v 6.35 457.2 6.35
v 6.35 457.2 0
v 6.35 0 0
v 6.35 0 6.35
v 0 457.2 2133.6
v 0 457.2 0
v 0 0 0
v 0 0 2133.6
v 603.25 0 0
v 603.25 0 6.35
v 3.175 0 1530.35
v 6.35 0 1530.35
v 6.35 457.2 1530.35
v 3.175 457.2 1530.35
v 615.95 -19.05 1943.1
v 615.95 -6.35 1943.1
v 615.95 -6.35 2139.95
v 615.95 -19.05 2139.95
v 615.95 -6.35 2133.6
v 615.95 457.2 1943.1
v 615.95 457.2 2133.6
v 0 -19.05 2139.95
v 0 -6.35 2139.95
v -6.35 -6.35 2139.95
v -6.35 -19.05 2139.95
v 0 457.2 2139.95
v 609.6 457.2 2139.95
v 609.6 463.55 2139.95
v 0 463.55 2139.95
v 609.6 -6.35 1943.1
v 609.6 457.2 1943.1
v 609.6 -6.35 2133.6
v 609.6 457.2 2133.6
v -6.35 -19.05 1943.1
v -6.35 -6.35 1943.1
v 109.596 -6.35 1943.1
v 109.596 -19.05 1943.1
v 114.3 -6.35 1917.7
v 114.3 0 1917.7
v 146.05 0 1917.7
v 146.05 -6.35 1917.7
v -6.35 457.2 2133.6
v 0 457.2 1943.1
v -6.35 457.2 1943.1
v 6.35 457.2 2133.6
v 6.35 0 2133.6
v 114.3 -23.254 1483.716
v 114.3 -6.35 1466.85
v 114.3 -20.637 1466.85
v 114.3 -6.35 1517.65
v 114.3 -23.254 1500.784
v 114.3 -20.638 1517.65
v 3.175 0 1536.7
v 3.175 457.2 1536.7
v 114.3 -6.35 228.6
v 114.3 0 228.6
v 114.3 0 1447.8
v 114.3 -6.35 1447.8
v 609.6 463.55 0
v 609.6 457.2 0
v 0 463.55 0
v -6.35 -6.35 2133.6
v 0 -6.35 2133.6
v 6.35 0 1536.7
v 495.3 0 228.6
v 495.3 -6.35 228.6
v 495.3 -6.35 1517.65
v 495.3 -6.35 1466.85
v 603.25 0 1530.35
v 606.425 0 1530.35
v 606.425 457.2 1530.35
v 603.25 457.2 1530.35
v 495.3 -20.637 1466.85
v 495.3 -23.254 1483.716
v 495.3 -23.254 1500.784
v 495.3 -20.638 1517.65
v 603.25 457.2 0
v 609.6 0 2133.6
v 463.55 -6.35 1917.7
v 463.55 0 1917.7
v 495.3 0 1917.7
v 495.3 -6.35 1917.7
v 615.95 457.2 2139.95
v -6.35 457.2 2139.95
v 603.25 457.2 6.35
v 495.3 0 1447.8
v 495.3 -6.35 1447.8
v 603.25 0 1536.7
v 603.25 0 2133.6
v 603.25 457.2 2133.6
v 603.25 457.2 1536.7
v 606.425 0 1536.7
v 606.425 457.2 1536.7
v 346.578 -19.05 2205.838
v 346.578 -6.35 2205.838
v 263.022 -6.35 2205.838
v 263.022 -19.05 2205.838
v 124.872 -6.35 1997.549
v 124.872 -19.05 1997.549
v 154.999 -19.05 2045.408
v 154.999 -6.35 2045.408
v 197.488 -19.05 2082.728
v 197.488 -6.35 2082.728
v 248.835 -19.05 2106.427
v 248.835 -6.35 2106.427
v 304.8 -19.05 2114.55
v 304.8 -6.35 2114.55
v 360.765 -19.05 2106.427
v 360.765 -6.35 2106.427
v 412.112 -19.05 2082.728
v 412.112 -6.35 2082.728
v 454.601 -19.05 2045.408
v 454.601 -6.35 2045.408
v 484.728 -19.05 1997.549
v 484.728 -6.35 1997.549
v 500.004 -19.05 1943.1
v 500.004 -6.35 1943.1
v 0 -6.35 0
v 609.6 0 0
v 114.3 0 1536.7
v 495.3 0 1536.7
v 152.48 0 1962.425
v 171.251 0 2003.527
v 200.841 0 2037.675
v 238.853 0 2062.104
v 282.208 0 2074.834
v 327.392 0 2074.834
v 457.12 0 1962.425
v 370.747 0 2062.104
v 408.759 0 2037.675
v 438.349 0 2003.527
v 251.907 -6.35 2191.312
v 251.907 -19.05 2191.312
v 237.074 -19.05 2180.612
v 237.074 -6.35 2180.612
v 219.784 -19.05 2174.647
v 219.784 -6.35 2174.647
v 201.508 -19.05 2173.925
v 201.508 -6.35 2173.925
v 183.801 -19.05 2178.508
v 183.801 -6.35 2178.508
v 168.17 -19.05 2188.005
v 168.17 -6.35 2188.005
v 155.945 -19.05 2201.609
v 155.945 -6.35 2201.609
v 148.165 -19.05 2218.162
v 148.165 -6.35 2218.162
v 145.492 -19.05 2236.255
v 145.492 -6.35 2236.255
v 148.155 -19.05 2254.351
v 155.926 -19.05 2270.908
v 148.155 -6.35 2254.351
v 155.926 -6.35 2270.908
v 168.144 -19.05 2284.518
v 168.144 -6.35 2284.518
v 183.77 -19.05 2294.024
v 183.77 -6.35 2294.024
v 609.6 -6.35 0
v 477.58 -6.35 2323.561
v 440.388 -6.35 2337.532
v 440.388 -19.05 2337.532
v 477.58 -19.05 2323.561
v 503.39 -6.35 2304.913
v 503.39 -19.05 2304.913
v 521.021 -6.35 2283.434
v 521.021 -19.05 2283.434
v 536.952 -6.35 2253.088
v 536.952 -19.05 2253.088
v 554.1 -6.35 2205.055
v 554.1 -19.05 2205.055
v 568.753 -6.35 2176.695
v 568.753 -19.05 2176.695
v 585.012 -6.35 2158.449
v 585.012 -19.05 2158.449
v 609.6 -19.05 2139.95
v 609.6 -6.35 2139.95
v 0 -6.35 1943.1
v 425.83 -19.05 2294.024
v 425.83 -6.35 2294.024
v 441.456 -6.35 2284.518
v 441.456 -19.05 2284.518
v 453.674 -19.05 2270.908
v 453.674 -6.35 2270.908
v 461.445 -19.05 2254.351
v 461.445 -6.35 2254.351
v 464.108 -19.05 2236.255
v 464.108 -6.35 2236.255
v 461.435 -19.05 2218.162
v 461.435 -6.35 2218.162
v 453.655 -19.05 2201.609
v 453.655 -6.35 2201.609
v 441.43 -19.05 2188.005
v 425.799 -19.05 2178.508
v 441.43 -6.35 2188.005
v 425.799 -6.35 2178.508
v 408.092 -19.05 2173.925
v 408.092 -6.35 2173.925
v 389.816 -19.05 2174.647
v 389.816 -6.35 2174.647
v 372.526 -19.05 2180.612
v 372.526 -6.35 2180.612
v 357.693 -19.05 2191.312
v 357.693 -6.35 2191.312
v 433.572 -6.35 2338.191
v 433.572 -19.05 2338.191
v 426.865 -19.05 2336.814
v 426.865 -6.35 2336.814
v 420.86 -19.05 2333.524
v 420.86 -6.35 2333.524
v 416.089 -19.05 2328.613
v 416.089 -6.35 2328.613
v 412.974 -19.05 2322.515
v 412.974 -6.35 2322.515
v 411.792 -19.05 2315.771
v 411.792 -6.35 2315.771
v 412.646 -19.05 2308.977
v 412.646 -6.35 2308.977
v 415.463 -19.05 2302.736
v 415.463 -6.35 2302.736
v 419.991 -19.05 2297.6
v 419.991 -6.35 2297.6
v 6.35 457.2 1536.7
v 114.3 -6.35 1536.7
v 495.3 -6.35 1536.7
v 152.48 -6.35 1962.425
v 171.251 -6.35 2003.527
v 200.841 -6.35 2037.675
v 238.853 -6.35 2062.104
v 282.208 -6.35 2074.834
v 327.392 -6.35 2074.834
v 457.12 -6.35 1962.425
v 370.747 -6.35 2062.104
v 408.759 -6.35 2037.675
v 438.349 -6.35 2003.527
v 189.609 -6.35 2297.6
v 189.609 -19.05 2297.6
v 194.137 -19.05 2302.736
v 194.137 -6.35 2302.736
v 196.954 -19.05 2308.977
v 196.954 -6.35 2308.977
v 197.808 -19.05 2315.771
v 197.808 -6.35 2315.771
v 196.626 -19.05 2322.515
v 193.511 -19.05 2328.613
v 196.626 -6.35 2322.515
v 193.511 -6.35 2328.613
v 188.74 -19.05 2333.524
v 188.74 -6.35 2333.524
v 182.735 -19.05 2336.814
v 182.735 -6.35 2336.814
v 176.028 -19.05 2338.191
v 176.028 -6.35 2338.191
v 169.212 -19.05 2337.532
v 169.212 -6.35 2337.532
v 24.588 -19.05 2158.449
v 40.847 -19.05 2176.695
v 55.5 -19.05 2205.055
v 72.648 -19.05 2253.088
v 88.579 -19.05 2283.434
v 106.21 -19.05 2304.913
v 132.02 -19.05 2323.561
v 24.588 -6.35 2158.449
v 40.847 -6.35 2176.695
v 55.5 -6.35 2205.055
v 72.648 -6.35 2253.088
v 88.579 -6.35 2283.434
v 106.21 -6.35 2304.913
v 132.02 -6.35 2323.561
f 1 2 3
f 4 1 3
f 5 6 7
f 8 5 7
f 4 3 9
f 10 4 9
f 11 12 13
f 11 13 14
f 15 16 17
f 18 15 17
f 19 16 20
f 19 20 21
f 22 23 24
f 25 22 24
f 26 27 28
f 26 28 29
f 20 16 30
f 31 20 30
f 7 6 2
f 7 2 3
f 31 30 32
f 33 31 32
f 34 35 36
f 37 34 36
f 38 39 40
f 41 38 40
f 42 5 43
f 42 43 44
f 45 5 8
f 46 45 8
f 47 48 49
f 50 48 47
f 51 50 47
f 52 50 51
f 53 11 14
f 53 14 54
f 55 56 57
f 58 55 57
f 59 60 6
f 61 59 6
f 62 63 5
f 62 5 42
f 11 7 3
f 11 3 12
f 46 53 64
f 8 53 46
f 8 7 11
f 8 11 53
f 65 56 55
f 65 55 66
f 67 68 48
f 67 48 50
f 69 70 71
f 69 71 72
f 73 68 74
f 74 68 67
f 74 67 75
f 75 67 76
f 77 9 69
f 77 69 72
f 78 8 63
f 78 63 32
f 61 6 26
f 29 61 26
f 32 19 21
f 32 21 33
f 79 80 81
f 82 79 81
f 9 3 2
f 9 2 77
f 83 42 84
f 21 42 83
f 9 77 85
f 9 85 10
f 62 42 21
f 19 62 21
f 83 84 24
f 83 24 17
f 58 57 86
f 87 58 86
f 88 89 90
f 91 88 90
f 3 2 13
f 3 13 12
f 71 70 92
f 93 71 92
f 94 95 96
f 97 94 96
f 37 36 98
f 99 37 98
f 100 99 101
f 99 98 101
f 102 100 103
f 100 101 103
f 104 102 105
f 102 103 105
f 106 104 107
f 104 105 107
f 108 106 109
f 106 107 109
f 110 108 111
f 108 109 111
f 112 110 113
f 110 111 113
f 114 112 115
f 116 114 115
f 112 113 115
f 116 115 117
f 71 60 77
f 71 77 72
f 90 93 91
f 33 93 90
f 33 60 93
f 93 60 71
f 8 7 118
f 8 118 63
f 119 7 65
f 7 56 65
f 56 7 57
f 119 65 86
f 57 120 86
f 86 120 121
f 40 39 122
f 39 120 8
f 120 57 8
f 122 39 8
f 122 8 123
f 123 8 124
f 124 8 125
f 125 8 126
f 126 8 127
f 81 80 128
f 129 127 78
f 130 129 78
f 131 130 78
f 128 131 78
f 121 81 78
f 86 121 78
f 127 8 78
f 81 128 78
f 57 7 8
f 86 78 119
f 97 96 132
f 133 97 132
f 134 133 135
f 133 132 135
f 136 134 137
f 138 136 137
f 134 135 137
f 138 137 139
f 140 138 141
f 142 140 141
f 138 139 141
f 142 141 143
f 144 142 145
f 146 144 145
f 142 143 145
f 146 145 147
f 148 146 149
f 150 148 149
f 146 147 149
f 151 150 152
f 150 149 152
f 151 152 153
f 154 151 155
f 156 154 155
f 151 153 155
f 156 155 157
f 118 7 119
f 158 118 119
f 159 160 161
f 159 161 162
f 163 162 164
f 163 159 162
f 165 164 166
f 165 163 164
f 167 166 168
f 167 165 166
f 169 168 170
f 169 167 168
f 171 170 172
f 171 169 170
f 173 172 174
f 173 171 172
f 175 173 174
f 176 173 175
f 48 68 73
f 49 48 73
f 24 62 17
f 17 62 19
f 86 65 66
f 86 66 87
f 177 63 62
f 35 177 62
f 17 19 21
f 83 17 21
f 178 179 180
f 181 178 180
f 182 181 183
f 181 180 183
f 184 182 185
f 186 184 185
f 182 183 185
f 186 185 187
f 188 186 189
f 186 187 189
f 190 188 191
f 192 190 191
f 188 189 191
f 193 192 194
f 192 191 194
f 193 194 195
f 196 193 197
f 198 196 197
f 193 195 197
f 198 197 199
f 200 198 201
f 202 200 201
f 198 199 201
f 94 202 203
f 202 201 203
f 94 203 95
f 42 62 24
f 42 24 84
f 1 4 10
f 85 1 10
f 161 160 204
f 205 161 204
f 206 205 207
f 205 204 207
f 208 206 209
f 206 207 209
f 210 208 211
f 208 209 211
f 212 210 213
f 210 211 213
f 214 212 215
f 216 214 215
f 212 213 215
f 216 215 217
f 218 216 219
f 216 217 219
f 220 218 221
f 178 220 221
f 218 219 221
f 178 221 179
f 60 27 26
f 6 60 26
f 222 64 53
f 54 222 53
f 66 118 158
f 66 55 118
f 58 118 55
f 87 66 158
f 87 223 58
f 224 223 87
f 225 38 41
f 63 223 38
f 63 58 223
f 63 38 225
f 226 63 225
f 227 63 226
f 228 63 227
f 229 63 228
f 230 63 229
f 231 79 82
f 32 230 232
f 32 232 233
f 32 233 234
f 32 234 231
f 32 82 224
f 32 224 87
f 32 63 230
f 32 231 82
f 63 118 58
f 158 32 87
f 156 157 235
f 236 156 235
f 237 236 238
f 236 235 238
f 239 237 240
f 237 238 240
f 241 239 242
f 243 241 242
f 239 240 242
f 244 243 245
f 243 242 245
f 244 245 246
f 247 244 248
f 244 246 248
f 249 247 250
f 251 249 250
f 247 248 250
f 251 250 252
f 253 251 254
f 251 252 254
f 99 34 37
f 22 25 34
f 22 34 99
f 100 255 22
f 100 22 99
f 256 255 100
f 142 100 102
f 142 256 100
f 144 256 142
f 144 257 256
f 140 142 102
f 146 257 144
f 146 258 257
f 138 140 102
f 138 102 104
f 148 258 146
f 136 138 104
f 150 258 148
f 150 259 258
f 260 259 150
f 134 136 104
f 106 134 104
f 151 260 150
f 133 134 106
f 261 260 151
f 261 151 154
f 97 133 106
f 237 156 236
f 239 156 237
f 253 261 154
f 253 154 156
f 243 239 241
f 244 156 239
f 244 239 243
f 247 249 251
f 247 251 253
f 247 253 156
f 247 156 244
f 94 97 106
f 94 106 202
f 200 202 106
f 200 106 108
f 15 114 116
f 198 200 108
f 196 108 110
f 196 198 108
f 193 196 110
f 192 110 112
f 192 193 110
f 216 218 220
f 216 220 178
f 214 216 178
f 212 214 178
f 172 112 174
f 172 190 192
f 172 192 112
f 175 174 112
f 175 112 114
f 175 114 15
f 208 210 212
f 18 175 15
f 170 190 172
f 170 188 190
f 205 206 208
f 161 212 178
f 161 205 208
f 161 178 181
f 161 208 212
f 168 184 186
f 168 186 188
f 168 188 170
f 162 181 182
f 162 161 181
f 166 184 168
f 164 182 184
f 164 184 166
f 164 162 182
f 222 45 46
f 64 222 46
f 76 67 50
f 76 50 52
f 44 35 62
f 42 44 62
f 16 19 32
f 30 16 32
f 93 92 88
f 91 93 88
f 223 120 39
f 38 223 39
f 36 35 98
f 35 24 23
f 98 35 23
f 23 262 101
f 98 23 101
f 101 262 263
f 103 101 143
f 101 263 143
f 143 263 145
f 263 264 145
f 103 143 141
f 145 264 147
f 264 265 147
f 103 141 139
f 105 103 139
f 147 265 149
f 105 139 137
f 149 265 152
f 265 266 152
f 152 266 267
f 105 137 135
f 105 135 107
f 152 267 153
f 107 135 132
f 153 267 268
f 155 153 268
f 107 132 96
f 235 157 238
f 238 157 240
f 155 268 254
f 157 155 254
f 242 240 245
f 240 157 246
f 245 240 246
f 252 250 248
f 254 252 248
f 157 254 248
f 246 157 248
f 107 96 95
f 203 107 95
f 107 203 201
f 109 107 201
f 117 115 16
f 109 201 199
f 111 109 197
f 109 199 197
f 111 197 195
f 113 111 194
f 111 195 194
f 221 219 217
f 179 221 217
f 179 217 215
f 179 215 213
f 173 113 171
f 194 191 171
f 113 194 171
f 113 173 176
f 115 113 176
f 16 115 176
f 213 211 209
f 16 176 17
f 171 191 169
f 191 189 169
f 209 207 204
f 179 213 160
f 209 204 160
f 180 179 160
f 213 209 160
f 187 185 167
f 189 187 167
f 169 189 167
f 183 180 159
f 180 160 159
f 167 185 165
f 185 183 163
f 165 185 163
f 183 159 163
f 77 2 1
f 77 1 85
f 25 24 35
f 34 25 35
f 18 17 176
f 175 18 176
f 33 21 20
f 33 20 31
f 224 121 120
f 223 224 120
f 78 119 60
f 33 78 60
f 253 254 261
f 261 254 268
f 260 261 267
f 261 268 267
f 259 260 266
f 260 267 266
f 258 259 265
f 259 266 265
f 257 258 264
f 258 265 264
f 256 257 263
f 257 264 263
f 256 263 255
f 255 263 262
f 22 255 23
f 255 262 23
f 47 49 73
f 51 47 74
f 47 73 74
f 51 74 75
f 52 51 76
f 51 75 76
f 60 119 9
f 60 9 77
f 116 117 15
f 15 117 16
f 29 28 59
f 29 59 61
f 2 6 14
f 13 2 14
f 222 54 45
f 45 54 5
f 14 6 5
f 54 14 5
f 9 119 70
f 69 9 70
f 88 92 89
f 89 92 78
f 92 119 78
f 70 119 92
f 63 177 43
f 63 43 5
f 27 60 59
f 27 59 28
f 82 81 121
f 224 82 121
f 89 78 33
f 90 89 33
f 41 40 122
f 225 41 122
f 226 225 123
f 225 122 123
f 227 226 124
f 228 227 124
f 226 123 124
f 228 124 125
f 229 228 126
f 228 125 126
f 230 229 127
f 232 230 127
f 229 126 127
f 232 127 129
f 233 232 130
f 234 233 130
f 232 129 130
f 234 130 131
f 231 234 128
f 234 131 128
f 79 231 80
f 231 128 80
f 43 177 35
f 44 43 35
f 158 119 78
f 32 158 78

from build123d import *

# Parameters (mm, degrees)
F0_W      = 609.6
F0_H      = 2133.6
F0_W_2    = 381
F0_H_2    = 1219.2
F1_DEPTH  = 6.35
F2_W      = 457.2
F2_H      = 2133.6
F3_DEPTH  = 6.35
F4_W      = 457.2
F4_H      = 2133.6
F5_DEPTH  = 6.35
F7_DEPTH  = 12.7
F8_W      = 6.35
F8_H      = 190.5
F9_DEPTH  = 463.55
F10_W     = 622.3
F10_H     = 463.55
F11_DEPTH = 6.35
F12_W     = 596.9
F12_H     = 457.2
F13_DEPTH = 6.35
F14_W     = 603.25
F14_H     = 6.35
F15_DEPTH = 457.2
F16_W     = 14.2875
F16_H     = 50.8
F17_DEPTH = 381
F18_W     = 609.6
F18_H     = 2139.95
F19_DEPTH = 6.35


with BuildPart() as f1:
    # F0 (on Front) → F1 (new body)
    with BuildSketch(Plane.XZ):
        with Locations((304.8, 1066.8)):
            Rectangle(F0_W, F0_H)
        with Locations((304.8, 838.2)):
            Rectangle(F0_W_2, F0_H_2, mode=Mode.SUBTRACT)
        with BuildLine():
            Line((463.55, 1917.7), (495.3, 1917.7))
            Line((495.3, 1917.7), (495.3, 1536.7))
            Line((495.3, 1536.7), (114.3, 1536.7))
            Line((114.3, 1536.7), (114.3, 1917.7))
            Line((114.3, 1917.7), (146.05, 1917.7))
            ThreePointArc((146.05, 1917.7), (304.8, 2076.45), (463.55, 1917.7))
        make_face(mode=Mode.SUBTRACT)
    extrude(amount=F1_DEPTH)


with BuildPart() as f3:
    # F2 (on face) → F3 (new body)
    with BuildSketch(Plane.YZ.offset(609.6)):
        with Locations((228.6, 1066.8)):
            Rectangle(F2_W, F2_H)
    extrude(amount=-F3_DEPTH)


with BuildPart() as f5:
    # F4 (on face) → F5 (new body)
    with BuildSketch(Plane(origin=(0, 0, 0), x_dir=(0, -1, 0), z_dir=(-1, 0, 0))):
        with Locations((-228.6, 1066.8)):
            Rectangle(F4_W, F4_H)
    extrude(amount=-F5_DEPTH)


with BuildPart() as f7:
    # F6 (on face) → F7 (new body)
    with BuildSketch(Plane.XZ.offset(6.35)):
        with BuildLine():
            Line((0, 2133.6), (609.6, 2133.6))
            Line((609.6, 2133.6), (609.6, 2139.95))
            add(Edge.make_bspline(
                [(440.3879281905, 2337.5324360536), (486.9381206642, 2325.8629227688), (526.4502828103, 2285.2095078003), (550.7297351415, 2216.4126873435), (565.4865401656, 2167.7223258119), (609.6, 2139.95)],
                knots=[0, 0, 0, 0, 0.3580567719, 0.6428278206, 1, 1, 1, 1], degree=3))
            ThreePointArc((440.3879281905, 2337.5324360536), (412.973805792, 2322.5154000224), (425.8299925146, 2294.0239286494))
            ThreePointArc((425.8299925146, 2294.0239286494), (448.0413685505, 2194.3586440297), (346.5783555928, 2205.8378071219))
            Line((346.5783555928, 2205.8378071219), (304.8, 2205.8378071219))
            Line((304.8, 2205.8378071219), (263.0216444072, 2205.8378071219))
            ThreePointArc((263.0216444072, 2205.8378071219), (161.5586314495, 2194.3586440297), (183.7700074854, 2294.0239286494))
            ThreePointArc((183.7700074854, 2294.0239286494), (196.626194208, 2322.5154000224), (169.2120718095, 2337.5324360536))
            add(Edge.make_bspline(
                [(169.2120718095, 2337.5324360536), (122.6618793358, 2325.8629227688), (83.1497171897, 2285.2095078003), (58.8702648585, 2216.4126873435), (44.1134598344, 2167.7223258119), (0, 2139.95)],
                knots=[0, 0, 0, 0, 0.3580567719, 0.6428278206, 1, 1, 1, 1], degree=3))
            Line((0, 2139.95), (0, 2133.6))
        make_face()
        with BuildLine():
            ThreePointArc((109.5955879085, 1943.1), (304.8, 2114.55), (500.0044120915, 1943.1))
            Line((500.0044120915, 1943.1), (609.6, 1943.1))
            Line((609.6, 1943.1), (609.6, 2133.6))
            Line((609.6, 2133.6), (0, 2133.6))
            Line((0, 2133.6), (0, 1943.1))
            Line((0, 1943.1), (109.5955879085, 1943.1))
        make_face()
        Polygon((609.6, 2133.6), (609.6, 1943.1), (615.95, 1943.1), (615.95, 2139.95), (609.6, 2139.95), align=None)
        Polygon((-6.35, 1943.1), (0, 1943.1), (0, 2133.6), (0, 2139.95), (-6.35, 2139.95), align=None)
    extrude(amount=F7_DEPTH)


with BuildPart() as f9:
    # F8 (on face) → F9 (new body, through all)
    with BuildSketch(Plane(origin=(0, -6.35, 0), x_dir=(-1, 0, 0), z_dir=(0, 1, 0))):
        with Locations((-612.775, 2038.35)):
            Rectangle(F8_W, F8_H)
    extrude(amount=F9_DEPTH)


with BuildPart() as f9b:
    # F8 (on face) → F9, piece 2 (new body, through all)
    with BuildSketch(Plane(origin=(0, -6.35, 0), x_dir=(-1, 0, 0), z_dir=(0, 1, 0))):
        with Locations((3.175, 2038.35)):
            Rectangle(F8_W, F8_H)
    extrude(amount=F9_DEPTH)


with BuildPart() as f11:
    # F10 (on face) → F11 (new body)
    with BuildSketch(Plane.XY.offset(2133.6)):
        with Locations((304.8, 225.425)):
            Rectangle(F10_W, F10_H)
    extrude(amount=F11_DEPTH)


with BuildPart() as f13:
    # F12 (on face) → F13 (new body)
    with BuildSketch(Plane(origin=(0, 0, 0), x_dir=(1, 0, 0), z_dir=(0, 0, -1))):
        with Locations((304.8, -228.6)):
            Rectangle(F12_W, F12_H)
    extrude(amount=-F13_DEPTH)


with BuildPart() as f15_tool:
    # F14 (on face) → F15 (new body, through all)
    with BuildSketch(Plane(origin=(0, 0, 0), x_dir=(-1, 0, 0), z_dir=(0, 1, 0))):
        with Locations((-304.8, 1533.525)):
            Rectangle(F14_W, F14_H)
    extrude(amount=F15_DEPTH)


with BuildPart() as f3_1:
    add(f3.part)

    # F15: cut by f15_tool
    add(f15_tool.part, mode=Mode.SUBTRACT)


with BuildPart() as f5_1:
    add(f5.part)

    # F15: cut by f15_tool
    add(f15_tool.part, mode=Mode.SUBTRACT)


with BuildPart() as f17:
    # F16 (on face) → F17 (new body, through all)
    with BuildSketch(Plane(origin=(495.3, 0, 0), x_dir=(0, -1, 0), z_dir=(-1, 0, 0))):
        with Locations((13.49375, 1492.25)):
            Rectangle(F16_W, F16_H)
        with BuildLine():
            ThreePointArc((20.6375, 1466.85), (23.5824851841, 1492.25), (20.6375, 1517.65))
            Line((20.6375, 1517.65), (20.6375, 1466.85))
        make_face()
    extrude(amount=F17_DEPTH)


with BuildPart() as f19:
    # F18 (on face) → F19 (new body)
    with BuildSketch(Plane(origin=(0, 457.2, 0), x_dir=(-1, 0, 0), z_dir=(0, 1, 0))):
        with Locations((-304.8, 1069.975)):
            Rectangle(F18_W, F18_H)
    extrude(amount=F19_DEPTH)


solid = Compound([f1.part, f7.part, f9.part, f9b.part, f11.part, f13.part, f3_1.part, f5_1.part, f17.part, f19.part])
